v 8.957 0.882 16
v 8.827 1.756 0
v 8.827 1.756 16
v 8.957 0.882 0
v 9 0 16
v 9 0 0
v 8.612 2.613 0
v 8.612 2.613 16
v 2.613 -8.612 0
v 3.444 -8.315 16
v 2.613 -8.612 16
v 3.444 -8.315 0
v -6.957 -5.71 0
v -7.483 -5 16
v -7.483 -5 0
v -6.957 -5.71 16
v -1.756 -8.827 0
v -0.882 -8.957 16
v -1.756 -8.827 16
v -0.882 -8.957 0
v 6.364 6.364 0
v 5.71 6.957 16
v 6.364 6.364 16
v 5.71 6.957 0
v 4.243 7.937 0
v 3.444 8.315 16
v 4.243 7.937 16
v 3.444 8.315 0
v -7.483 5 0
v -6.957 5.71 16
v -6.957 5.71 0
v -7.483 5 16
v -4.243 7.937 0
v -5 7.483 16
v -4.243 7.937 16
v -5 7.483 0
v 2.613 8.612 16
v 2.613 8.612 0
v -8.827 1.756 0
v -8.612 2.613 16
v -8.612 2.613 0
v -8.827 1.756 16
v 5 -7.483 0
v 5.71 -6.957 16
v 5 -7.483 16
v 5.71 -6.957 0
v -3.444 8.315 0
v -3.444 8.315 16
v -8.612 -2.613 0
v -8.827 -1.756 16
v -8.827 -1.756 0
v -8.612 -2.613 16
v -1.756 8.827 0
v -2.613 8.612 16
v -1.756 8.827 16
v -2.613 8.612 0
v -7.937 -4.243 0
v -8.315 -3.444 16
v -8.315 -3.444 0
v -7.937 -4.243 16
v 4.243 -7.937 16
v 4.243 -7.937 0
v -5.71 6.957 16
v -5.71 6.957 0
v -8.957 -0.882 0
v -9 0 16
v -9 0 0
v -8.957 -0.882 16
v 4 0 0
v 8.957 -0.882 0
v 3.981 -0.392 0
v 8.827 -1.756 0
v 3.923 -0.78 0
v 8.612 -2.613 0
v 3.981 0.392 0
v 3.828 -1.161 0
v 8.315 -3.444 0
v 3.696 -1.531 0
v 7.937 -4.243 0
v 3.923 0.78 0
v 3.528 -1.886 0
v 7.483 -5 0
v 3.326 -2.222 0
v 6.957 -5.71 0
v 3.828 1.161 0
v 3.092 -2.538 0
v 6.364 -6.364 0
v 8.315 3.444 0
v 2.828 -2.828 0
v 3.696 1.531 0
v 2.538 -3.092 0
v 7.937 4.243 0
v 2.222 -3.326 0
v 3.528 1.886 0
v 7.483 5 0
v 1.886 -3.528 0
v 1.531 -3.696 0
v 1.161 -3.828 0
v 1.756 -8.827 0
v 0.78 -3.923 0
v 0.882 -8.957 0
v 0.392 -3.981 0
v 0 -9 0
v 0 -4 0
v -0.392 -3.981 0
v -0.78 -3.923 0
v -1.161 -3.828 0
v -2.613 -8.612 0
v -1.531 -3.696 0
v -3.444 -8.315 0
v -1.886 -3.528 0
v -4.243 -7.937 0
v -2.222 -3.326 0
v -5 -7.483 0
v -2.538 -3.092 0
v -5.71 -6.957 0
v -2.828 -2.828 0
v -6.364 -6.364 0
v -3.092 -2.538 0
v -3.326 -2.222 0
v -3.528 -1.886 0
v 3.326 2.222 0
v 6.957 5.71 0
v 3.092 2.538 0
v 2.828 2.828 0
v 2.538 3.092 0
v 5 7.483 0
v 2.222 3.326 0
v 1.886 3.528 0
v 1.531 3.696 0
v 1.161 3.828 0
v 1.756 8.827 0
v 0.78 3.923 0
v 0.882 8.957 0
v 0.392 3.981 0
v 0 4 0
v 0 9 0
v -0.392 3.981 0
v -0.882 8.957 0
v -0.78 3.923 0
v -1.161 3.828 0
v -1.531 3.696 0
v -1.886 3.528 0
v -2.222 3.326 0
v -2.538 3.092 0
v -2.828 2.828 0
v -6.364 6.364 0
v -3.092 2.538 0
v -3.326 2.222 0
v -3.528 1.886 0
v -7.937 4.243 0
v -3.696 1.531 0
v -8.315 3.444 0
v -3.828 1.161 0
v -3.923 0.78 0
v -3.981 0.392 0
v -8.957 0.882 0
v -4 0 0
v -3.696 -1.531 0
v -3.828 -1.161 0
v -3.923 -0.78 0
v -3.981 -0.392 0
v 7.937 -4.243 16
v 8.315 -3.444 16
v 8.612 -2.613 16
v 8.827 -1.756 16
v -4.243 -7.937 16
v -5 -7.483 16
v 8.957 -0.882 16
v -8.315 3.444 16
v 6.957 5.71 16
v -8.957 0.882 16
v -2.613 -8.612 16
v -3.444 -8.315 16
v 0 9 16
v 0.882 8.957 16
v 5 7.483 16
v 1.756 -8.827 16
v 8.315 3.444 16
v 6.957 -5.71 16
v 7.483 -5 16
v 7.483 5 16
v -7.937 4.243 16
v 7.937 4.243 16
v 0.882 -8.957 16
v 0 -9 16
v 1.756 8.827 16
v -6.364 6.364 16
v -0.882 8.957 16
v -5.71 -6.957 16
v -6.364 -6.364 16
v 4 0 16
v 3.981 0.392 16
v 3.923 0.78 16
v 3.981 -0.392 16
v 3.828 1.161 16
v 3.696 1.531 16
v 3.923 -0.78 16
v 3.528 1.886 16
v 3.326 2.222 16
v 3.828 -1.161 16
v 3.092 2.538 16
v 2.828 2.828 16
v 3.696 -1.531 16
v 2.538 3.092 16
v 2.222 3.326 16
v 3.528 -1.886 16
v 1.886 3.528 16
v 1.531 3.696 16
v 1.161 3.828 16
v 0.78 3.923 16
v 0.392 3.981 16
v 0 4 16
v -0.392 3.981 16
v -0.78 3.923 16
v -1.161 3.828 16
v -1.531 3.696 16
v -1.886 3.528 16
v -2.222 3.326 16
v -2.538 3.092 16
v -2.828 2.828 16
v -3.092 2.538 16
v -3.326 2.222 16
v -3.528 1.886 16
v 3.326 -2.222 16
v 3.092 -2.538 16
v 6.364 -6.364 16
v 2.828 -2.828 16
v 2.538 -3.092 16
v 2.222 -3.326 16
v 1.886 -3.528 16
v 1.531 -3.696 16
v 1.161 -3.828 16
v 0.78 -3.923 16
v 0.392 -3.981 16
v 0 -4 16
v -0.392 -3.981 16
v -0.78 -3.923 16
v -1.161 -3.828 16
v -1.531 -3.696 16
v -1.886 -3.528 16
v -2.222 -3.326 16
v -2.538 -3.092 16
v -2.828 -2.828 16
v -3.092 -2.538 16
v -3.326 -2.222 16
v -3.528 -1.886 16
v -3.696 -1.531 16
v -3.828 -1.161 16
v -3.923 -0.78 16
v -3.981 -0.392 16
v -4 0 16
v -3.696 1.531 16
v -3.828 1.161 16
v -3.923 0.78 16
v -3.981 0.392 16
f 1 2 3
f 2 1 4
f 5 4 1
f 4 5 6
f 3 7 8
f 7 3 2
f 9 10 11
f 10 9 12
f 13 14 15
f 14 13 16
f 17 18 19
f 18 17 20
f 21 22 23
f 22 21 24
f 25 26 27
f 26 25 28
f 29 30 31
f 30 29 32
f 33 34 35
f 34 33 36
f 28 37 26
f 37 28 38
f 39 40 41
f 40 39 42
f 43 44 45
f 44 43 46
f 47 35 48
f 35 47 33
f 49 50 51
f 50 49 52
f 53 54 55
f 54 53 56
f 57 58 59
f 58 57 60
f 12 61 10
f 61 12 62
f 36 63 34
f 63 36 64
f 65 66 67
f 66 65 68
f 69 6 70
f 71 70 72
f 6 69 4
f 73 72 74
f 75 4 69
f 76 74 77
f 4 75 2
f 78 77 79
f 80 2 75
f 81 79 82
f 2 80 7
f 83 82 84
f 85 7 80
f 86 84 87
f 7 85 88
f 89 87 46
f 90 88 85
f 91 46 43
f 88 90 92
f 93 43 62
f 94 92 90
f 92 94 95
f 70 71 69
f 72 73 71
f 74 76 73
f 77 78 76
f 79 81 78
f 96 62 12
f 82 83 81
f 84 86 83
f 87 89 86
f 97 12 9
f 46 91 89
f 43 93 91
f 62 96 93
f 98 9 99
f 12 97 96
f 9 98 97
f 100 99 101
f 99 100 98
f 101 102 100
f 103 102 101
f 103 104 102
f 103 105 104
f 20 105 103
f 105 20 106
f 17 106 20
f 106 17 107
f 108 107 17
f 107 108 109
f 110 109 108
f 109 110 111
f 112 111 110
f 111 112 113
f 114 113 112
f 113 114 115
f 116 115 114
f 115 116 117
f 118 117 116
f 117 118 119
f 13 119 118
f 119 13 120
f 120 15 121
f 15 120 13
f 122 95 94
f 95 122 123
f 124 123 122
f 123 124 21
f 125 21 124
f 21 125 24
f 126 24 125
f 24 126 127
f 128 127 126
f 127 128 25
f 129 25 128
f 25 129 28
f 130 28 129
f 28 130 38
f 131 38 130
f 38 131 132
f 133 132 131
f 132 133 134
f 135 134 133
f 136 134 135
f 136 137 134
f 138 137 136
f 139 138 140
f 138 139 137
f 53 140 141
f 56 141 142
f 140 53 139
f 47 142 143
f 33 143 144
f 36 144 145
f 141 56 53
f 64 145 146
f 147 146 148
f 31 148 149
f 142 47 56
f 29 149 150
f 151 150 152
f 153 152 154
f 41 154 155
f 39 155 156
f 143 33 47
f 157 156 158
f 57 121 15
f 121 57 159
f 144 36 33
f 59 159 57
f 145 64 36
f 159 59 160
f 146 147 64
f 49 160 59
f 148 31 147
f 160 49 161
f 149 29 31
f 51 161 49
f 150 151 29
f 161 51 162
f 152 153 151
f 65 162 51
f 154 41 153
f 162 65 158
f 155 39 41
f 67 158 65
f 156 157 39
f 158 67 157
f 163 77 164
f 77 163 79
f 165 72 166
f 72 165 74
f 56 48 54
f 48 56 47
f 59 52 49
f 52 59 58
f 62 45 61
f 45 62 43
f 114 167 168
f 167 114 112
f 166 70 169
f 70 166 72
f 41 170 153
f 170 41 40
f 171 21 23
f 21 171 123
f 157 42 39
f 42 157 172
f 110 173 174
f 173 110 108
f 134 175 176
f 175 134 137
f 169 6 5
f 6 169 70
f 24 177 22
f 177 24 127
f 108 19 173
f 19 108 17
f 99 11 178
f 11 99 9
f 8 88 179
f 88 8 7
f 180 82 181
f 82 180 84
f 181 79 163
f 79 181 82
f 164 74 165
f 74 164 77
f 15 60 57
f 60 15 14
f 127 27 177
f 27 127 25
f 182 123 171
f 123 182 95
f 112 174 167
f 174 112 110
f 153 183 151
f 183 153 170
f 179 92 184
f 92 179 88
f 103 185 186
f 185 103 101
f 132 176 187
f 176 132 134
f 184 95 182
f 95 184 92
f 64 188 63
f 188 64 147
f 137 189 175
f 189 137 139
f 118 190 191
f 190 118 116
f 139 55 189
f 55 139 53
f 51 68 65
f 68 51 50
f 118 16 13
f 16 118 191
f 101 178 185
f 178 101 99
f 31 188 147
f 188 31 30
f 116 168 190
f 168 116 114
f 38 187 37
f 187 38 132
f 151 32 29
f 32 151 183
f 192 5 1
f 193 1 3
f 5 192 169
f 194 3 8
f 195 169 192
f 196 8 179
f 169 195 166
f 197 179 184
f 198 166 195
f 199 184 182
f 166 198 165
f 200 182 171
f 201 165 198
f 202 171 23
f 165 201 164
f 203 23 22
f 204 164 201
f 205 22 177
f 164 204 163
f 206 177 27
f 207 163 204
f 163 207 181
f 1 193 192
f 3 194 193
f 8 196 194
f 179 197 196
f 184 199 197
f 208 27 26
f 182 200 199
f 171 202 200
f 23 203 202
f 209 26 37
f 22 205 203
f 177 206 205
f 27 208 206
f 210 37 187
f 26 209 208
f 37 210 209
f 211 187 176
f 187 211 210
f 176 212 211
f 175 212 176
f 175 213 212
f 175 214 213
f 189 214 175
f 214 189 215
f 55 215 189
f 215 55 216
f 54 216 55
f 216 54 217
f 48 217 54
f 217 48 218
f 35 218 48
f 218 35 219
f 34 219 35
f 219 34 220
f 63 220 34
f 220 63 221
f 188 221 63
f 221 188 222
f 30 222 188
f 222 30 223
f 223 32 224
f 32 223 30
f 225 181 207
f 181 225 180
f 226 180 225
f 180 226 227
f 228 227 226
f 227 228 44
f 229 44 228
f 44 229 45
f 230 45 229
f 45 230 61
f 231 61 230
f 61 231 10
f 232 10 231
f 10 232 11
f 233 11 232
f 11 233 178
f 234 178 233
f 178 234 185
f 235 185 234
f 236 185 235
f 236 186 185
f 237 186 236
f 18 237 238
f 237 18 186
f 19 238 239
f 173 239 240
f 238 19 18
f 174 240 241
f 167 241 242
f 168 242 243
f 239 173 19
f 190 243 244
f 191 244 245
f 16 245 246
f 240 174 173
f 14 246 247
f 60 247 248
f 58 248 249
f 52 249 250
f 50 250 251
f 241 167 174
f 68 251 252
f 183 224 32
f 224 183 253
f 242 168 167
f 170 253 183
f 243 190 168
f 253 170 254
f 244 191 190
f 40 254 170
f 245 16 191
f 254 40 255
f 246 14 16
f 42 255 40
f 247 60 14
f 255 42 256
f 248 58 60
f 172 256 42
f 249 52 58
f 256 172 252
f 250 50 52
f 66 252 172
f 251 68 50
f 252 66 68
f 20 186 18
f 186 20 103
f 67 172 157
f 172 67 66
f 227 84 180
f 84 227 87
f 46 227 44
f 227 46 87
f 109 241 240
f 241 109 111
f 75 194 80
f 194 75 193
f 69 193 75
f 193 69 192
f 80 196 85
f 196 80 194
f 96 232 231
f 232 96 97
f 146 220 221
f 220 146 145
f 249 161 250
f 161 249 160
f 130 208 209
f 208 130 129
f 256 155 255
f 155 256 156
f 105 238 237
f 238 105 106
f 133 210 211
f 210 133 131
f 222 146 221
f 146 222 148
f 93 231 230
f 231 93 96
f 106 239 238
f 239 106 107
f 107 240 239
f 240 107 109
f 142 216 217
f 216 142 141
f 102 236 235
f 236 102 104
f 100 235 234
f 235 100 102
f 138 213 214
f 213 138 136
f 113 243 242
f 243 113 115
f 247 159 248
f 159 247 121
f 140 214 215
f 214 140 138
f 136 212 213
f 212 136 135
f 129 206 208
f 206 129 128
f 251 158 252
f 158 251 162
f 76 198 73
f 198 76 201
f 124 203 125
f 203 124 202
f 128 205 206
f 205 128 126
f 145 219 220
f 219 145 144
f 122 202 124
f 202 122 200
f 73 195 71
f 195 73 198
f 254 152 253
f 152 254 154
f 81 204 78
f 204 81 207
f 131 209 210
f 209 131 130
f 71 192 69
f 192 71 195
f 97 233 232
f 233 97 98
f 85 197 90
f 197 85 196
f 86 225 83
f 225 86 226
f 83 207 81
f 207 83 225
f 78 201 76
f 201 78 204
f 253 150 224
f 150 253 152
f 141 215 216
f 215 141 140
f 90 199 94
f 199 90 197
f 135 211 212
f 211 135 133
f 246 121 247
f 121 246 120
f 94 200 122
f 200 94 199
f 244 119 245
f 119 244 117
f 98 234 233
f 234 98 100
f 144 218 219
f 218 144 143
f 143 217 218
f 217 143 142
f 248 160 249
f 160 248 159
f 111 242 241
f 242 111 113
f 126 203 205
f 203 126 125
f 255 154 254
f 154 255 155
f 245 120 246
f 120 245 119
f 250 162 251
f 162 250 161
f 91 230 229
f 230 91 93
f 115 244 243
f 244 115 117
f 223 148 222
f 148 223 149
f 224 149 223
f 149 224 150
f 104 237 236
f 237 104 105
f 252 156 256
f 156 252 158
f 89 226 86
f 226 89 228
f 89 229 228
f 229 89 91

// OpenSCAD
module threaded_heat_set_insert() {
    difference() {
        // Outer cylinder
        cylinder(h=16.0, d=18.0, $fn=64);
        
        // Inner threaded hole for 8.0mm screws
        translate([0, 0, -1])
            cylinder(h=18.0, d=8.0, $fn=64);
    }
}

threaded_heat_set_insert();
